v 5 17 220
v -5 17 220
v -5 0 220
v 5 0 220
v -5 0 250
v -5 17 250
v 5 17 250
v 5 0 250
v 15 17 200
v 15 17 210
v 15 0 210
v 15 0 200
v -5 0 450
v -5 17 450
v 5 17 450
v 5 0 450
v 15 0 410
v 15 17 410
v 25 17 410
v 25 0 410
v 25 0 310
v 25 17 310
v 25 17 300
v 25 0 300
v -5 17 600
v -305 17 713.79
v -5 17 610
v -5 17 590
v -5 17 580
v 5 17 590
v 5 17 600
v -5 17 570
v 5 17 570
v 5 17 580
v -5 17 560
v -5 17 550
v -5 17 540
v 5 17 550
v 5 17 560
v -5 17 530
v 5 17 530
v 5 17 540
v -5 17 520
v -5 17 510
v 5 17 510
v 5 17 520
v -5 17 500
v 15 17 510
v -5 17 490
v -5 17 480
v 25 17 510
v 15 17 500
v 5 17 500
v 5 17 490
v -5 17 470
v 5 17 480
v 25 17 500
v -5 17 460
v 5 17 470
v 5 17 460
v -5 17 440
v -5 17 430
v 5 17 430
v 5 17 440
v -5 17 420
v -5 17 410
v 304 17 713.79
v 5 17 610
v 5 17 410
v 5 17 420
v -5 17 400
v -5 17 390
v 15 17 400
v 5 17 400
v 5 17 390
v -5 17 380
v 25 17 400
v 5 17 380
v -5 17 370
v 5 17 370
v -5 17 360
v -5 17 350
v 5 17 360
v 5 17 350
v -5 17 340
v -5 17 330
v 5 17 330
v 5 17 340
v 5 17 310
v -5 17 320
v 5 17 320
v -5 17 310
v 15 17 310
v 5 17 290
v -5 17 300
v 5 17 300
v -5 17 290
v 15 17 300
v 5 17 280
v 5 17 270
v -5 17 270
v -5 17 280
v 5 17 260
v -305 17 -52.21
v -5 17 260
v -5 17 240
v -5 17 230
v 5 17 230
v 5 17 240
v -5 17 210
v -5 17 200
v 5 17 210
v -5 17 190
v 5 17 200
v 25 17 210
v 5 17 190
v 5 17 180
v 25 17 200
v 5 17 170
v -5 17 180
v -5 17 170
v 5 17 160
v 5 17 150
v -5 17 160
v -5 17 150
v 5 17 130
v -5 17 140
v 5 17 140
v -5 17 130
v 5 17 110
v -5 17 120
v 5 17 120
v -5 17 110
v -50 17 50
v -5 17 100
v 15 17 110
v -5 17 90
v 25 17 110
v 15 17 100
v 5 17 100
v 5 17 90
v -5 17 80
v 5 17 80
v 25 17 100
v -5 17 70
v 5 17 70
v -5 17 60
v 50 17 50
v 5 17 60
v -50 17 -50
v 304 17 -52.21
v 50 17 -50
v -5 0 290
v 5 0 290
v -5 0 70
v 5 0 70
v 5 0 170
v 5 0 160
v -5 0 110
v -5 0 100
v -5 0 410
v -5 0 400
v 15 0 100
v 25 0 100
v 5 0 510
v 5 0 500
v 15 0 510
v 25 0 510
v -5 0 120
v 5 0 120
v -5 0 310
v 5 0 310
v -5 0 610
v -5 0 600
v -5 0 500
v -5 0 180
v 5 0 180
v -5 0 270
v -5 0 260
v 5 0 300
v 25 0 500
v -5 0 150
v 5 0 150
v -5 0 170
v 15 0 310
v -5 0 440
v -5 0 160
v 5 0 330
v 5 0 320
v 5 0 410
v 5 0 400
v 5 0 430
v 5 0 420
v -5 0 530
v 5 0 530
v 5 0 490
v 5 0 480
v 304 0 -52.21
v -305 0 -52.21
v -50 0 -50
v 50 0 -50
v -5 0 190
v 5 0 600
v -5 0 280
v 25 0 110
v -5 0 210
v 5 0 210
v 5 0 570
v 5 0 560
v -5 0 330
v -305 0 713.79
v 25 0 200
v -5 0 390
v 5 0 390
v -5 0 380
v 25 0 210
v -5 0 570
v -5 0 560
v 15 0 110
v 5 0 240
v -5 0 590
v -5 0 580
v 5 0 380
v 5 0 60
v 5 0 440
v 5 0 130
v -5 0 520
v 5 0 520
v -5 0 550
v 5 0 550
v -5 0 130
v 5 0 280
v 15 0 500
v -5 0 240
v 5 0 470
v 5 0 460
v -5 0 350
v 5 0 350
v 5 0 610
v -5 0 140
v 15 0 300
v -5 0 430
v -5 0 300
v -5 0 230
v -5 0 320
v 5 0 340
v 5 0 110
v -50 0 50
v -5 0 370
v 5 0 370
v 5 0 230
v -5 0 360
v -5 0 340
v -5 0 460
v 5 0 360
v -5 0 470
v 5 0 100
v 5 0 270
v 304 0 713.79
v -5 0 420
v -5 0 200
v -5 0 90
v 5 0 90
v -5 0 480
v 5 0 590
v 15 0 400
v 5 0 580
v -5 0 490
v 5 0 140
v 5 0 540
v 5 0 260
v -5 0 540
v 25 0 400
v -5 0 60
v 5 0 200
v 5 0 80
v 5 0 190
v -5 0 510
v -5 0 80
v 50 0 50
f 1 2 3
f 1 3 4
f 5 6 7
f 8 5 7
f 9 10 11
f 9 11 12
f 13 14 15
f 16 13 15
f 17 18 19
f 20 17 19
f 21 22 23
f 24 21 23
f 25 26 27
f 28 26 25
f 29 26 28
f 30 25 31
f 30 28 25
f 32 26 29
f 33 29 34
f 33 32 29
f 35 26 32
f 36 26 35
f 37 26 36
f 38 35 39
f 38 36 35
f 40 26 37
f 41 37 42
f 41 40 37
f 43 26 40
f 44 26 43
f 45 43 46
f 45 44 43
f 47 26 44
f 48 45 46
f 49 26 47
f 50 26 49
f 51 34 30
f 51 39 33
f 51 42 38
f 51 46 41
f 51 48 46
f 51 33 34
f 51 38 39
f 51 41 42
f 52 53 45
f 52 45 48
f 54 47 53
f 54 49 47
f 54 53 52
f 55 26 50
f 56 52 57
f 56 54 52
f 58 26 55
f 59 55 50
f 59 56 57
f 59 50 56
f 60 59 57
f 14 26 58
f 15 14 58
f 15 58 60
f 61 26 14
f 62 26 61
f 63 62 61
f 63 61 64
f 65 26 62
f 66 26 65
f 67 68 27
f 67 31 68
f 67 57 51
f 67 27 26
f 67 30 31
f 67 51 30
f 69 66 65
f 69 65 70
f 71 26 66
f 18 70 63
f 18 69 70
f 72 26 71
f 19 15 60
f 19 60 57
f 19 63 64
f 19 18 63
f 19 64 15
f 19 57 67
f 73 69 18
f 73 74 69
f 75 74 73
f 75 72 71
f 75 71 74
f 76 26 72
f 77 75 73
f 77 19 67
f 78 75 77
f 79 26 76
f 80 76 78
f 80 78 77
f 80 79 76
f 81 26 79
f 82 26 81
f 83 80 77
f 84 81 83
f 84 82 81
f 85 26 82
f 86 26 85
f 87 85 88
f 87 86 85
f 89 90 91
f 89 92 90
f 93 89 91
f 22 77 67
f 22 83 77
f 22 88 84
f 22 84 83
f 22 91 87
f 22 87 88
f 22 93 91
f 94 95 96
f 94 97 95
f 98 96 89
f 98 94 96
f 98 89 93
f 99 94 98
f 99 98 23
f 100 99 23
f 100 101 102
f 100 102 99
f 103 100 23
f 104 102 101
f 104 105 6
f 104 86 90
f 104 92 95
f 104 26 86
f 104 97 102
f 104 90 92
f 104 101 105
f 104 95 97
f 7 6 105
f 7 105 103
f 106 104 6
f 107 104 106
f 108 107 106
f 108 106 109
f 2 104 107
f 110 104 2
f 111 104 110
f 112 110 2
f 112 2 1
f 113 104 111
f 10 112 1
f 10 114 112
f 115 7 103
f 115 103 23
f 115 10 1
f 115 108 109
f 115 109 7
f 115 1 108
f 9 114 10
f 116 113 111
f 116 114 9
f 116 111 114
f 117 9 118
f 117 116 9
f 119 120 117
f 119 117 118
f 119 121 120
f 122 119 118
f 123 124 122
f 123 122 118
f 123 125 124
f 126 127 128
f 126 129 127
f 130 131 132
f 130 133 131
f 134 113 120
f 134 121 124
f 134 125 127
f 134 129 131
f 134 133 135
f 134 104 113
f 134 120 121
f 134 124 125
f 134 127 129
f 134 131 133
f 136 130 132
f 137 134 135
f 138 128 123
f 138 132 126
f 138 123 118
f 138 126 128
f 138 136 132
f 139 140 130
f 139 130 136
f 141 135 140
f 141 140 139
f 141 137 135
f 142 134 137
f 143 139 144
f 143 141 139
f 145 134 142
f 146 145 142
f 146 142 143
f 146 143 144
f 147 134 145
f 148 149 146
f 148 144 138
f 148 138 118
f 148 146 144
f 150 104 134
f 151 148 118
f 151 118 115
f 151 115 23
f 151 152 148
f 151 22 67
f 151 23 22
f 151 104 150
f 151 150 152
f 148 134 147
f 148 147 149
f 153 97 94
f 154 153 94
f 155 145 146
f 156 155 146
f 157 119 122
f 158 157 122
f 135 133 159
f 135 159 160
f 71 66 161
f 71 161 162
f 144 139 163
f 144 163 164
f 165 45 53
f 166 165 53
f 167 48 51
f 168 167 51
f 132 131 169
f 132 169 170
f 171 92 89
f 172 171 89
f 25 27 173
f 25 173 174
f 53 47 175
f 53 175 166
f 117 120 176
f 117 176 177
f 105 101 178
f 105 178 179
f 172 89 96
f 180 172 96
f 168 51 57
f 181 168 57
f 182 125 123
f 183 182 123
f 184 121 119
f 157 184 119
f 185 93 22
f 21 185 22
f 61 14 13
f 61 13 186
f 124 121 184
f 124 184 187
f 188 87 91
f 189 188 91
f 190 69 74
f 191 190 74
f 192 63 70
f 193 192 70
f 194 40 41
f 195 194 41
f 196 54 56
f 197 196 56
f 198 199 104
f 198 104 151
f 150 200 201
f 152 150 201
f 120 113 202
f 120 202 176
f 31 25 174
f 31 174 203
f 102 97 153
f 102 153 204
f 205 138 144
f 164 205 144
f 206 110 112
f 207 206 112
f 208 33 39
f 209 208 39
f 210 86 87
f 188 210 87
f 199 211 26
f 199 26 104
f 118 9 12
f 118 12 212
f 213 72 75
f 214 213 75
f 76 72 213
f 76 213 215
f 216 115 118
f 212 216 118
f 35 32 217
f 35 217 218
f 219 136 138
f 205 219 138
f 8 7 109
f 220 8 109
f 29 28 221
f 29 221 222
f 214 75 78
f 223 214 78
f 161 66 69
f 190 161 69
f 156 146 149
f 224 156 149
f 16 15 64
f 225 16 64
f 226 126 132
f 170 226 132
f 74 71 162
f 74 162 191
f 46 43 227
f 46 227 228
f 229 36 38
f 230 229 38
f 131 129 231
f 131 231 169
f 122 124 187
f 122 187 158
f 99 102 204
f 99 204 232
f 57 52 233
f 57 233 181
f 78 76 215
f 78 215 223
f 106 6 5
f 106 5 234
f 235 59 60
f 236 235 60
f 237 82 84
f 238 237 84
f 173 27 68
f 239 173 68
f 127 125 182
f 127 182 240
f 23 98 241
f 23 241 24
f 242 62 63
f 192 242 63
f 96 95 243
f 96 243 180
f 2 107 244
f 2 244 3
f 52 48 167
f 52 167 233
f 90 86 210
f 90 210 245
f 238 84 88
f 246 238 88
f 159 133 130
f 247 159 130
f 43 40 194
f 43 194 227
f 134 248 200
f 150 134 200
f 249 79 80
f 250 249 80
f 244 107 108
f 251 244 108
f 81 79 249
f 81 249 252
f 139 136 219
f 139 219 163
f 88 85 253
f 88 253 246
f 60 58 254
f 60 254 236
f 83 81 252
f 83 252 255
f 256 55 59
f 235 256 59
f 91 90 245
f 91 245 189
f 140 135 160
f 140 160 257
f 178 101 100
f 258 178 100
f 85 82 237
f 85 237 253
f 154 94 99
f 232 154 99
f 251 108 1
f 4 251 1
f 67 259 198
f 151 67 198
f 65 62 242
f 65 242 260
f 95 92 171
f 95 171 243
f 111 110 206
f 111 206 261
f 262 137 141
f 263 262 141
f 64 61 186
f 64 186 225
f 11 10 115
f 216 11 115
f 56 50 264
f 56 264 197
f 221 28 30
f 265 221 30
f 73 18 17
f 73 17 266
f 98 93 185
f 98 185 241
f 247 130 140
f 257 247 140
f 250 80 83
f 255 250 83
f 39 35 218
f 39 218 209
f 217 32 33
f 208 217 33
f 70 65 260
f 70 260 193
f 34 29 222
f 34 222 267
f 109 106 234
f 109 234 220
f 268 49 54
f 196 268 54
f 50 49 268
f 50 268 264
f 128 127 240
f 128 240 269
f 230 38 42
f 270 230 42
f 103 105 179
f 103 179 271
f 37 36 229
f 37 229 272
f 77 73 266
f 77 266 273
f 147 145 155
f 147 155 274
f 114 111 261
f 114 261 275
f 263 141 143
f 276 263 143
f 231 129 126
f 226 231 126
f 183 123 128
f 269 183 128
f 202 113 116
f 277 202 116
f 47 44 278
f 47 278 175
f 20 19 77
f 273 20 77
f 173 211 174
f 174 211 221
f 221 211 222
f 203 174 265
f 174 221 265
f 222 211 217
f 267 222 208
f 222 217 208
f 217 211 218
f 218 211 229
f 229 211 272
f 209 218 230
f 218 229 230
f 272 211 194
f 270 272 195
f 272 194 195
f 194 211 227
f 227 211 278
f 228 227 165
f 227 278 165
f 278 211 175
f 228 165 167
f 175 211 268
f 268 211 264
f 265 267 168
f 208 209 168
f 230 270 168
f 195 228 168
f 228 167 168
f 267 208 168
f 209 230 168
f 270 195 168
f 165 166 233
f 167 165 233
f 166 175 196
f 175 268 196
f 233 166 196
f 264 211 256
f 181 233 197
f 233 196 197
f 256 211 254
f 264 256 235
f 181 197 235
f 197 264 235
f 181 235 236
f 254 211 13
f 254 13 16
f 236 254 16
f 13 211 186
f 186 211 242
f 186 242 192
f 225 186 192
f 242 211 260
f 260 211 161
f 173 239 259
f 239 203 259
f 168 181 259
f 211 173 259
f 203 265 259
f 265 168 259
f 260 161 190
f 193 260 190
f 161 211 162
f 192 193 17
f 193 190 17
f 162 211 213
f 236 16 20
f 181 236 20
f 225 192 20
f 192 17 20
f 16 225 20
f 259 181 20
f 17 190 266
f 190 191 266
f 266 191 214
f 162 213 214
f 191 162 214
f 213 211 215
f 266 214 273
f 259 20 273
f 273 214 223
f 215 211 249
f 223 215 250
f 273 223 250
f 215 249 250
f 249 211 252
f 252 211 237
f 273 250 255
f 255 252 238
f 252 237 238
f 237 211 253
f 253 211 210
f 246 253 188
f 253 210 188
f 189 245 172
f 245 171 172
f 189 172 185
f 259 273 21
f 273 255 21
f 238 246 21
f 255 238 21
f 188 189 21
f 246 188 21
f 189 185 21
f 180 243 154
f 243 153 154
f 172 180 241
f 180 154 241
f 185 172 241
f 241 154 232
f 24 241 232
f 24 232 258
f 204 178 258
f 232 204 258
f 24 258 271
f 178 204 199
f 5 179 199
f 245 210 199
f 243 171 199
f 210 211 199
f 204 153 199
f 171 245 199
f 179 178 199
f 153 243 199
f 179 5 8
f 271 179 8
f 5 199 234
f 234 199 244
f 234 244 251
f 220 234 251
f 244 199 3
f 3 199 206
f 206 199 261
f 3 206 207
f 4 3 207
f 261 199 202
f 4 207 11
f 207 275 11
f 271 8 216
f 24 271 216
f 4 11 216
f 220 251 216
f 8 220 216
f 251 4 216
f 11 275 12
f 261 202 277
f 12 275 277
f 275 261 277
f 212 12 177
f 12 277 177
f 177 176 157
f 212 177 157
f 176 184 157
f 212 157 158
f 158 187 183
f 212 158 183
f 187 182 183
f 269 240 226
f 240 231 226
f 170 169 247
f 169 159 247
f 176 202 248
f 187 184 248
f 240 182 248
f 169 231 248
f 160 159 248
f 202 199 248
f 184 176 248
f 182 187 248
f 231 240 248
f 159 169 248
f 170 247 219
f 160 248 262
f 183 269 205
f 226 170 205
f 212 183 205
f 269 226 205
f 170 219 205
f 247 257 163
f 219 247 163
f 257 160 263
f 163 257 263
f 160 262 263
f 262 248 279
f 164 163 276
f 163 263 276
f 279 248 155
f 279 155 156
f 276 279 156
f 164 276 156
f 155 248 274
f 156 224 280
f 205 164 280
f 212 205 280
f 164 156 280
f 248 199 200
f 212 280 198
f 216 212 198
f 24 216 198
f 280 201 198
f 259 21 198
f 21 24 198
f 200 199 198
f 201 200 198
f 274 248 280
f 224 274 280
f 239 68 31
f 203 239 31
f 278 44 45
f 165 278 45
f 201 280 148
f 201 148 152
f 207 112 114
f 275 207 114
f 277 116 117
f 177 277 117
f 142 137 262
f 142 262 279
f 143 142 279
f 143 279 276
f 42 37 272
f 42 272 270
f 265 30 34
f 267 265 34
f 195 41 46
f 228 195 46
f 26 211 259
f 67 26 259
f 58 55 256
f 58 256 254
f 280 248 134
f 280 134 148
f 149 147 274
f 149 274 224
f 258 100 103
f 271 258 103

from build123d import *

# Parameters (mm, degrees)
SKETCH1_W           = 609
SKETCH1_H           = 766
SKETCH1_W_2         = 10
SKETCH1_H_2         = 10
SKETCH1_W_3         = 100
SKETCH1_H_3         = 100
BOSS_EXTRUDE1_DEPTH = 17


with BuildPart() as part:
    # Sketch1 → Boss-Extrude1 (new body)
    with BuildSketch(Plane(origin=(0, 0, 0), x_dir=(1, 0, 0), z_dir=(0, 1, 0))):
        with Locations((-0.5, -330.79)):
            Rectangle(SKETCH1_W, SKETCH1_H)
        with Locations((0, -85)):
            Rectangle(SKETCH1_W_2, SKETCH1_H_2, mode=Mode.SUBTRACT)
        Rectangle(SKETCH1_W_3, SKETCH1_H_3, mode=Mode.SUBTRACT)
        with Locations((0, -65)):
            Rectangle(SKETCH1_W_2, SKETCH1_H_2, mode=Mode.SUBTRACT)
        with Locations((0, -105)):
            Rectangle(SKETCH1_W_2, SKETCH1_H_2, mode=Mode.SUBTRACT)
        with Locations((0, -125)):
            Rectangle(SKETCH1_W_2, SKETCH1_H_2, mode=Mode.SUBTRACT)
        with Locations((0, -145)):
            Rectangle(SKETCH1_W_2, SKETCH1_H_2, mode=Mode.SUBTRACT)
        with Locations((0, -165)):
            Rectangle(SKETCH1_W_2, SKETCH1_H_2, mode=Mode.SUBTRACT)
        with Locations((0, -185)):
            Rectangle(SKETCH1_W_2, SKETCH1_H_2, mode=Mode.SUBTRACT)
        with Locations((0, -205)):
            Rectangle(SKETCH1_W_2, SKETCH1_H_2, mode=Mode.SUBTRACT)
        with Locations((0, -225)):
            Rectangle(SKETCH1_W_2, SKETCH1_H_2, mode=Mode.SUBTRACT)
        with Locations((0, -245)):
            Rectangle(SKETCH1_W_2, SKETCH1_H_2, mode=Mode.SUBTRACT)
        with Locations((0, -265)):
            Rectangle(SKETCH1_W_2, SKETCH1_H_2, mode=Mode.SUBTRACT)
        with Locations((0, -285)):
            Rectangle(SKETCH1_W_2, SKETCH1_H_2, mode=Mode.SUBTRACT)
        with Locations((0, -305)):
            Rectangle(SKETCH1_W_2, SKETCH1_H_2, mode=Mode.SUBTRACT)
        with Locations((0, -325)):
            Rectangle(SKETCH1_W_2, SKETCH1_H_2, mode=Mode.SUBTRACT)
        with Locations((0, -345)):
            Rectangle(SKETCH1_W_2, SKETCH1_H_2, mode=Mode.SUBTRACT)
        with Locations((0, -365)):
            Rectangle(SKETCH1_W_2, SKETCH1_H_2, mode=Mode.SUBTRACT)
        with Locations((0, -385)):
            Rectangle(SKETCH1_W_2, SKETCH1_H_2, mode=Mode.SUBTRACT)
        with Locations((0, -405)):
            Rectangle(SKETCH1_W_2, SKETCH1_H_2, mode=Mode.SUBTRACT)
        with Locations((0, -425)):
            Rectangle(SKETCH1_W_2, SKETCH1_H_2, mode=Mode.SUBTRACT)
        with Locations((0, -445)):
            Rectangle(SKETCH1_W_2, SKETCH1_H_2, mode=Mode.SUBTRACT)
        with Locations((0, -465)):
            Rectangle(SKETCH1_W_2, SKETCH1_H_2, mode=Mode.SUBTRACT)
        with Locations((0, -485)):
            Rectangle(SKETCH1_W_2, SKETCH1_H_2, mode=Mode.SUBTRACT)
        with Locations((0, -505)):
            Rectangle(SKETCH1_W_2, SKETCH1_H_2, mode=Mode.SUBTRACT)
        with Locations((0, -525)):
            Rectangle(SKETCH1_W_2, SKETCH1_H_2, mode=Mode.SUBTRACT)
        with Locations((0, -545)):
            Rectangle(SKETCH1_W_2, SKETCH1_H_2, mode=Mode.SUBTRACT)
        with Locations((0, -565)):
            Rectangle(SKETCH1_W_2, SKETCH1_H_2, mode=Mode.SUBTRACT)
        with Locations((0, -585)):
            Rectangle(SKETCH1_W_2, SKETCH1_H_2, mode=Mode.SUBTRACT)
        with Locations((0, -605)):
            Rectangle(SKETCH1_W_2, SKETCH1_H_2, mode=Mode.SUBTRACT)
        with Locations((20, -105)):
            Rectangle(SKETCH1_W_2, SKETCH1_H_2, mode=Mode.SUBTRACT)
        with Locations((20, -205)):
            Rectangle(SKETCH1_W_2, SKETCH1_H_2, mode=Mode.SUBTRACT)
        with Locations((20, -305)):
            Rectangle(SKETCH1_W_2, SKETCH1_H_2, mode=Mode.SUBTRACT)
        with Locations((20, -405)):
            Rectangle(SKETCH1_W_2, SKETCH1_H_2, mode=Mode.SUBTRACT)
        with Locations((20, -505)):
            Rectangle(SKETCH1_W_2, SKETCH1_H_2, mode=Mode.SUBTRACT)
    extrude(amount=BOSS_EXTRUDE1_DEPTH)


solid = part.part
